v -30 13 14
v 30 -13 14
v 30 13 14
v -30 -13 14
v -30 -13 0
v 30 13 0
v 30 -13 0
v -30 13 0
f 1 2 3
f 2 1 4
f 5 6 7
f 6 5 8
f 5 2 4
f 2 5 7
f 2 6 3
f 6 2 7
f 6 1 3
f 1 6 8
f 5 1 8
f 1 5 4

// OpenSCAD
// A small, independent example showing what hull() does in OpenSCAD.
// The real corner bracket uses the same idea with a more complicated outline.
// Select a stage in the Customizer; no external library is required.

/* [Demonstration] */
demo_stage = "01_original_bar"; // [01_original_bar, 02_wide_layer, 03_two_layers, 04_hull, 05_result]

// All dimensions in millimetres.
length = 60;
width = 26;
height = 14;
chamfer = 5;
slice_thickness = 0.5;

// A plain bar: the starting shape whose sharp edges we want to soften.
module original_bar() {
    translate([0, 0, height / 2])
        cube([length, width, height], center = true);
}

// First input to hull(): a full-size, thin layer at the bottom.
module wide_layer() {
    translate([0, 0, slice_thickness / 2])
        cube([length, width, slice_thickness], center = true);
}

// Second input: a smaller layer at the top, leaving room for bevels.
module narrow_layer() {
    translate([0, 0, height - slice_thickness / 2])
        cube([length - 2 * chamfer, width - 2 * chamfer, slice_thickness],
             center = true);
}

// hull() wraps both layers in the smallest possible convex solid.
// The connections between the wide and narrow layers become slopes.
module sloped_hull() {
    hull() {
        wide_layer();
        narrow_layer();
    }
}

// intersection() keeps only volume shared by the bar and hull.
// Here the hull is entirely inside the bar, so the result equals the hull.
// In the actual L bracket, this clipping is more useful.
module clipped_bar() {
    intersection() {
        original_bar();
        sloped_hull();
    }
}

if (demo_stage == "01_original_bar") {
    color("LightSlateGray") original_bar();
} else if (demo_stage == "02_wide_layer") {
    color("RoyalBlue") wide_layer();
} else if (demo_stage == "03_two_layers") {
    color("RoyalBlue") wide_layer();
    color("Orange") narrow_layer();
} else if (demo_stage == "04_hull") {
    color("SteelBlue") sloped_hull();
} else if (demo_stage == "05_result") {
    // Side-by-side: the original square-edged bar and the bevelled result.
    translate([-38, 0, 0]) color("LightSlateGray") original_bar();
    translate([38, 0, 0]) color("SteelBlue") clipped_bar();
}
